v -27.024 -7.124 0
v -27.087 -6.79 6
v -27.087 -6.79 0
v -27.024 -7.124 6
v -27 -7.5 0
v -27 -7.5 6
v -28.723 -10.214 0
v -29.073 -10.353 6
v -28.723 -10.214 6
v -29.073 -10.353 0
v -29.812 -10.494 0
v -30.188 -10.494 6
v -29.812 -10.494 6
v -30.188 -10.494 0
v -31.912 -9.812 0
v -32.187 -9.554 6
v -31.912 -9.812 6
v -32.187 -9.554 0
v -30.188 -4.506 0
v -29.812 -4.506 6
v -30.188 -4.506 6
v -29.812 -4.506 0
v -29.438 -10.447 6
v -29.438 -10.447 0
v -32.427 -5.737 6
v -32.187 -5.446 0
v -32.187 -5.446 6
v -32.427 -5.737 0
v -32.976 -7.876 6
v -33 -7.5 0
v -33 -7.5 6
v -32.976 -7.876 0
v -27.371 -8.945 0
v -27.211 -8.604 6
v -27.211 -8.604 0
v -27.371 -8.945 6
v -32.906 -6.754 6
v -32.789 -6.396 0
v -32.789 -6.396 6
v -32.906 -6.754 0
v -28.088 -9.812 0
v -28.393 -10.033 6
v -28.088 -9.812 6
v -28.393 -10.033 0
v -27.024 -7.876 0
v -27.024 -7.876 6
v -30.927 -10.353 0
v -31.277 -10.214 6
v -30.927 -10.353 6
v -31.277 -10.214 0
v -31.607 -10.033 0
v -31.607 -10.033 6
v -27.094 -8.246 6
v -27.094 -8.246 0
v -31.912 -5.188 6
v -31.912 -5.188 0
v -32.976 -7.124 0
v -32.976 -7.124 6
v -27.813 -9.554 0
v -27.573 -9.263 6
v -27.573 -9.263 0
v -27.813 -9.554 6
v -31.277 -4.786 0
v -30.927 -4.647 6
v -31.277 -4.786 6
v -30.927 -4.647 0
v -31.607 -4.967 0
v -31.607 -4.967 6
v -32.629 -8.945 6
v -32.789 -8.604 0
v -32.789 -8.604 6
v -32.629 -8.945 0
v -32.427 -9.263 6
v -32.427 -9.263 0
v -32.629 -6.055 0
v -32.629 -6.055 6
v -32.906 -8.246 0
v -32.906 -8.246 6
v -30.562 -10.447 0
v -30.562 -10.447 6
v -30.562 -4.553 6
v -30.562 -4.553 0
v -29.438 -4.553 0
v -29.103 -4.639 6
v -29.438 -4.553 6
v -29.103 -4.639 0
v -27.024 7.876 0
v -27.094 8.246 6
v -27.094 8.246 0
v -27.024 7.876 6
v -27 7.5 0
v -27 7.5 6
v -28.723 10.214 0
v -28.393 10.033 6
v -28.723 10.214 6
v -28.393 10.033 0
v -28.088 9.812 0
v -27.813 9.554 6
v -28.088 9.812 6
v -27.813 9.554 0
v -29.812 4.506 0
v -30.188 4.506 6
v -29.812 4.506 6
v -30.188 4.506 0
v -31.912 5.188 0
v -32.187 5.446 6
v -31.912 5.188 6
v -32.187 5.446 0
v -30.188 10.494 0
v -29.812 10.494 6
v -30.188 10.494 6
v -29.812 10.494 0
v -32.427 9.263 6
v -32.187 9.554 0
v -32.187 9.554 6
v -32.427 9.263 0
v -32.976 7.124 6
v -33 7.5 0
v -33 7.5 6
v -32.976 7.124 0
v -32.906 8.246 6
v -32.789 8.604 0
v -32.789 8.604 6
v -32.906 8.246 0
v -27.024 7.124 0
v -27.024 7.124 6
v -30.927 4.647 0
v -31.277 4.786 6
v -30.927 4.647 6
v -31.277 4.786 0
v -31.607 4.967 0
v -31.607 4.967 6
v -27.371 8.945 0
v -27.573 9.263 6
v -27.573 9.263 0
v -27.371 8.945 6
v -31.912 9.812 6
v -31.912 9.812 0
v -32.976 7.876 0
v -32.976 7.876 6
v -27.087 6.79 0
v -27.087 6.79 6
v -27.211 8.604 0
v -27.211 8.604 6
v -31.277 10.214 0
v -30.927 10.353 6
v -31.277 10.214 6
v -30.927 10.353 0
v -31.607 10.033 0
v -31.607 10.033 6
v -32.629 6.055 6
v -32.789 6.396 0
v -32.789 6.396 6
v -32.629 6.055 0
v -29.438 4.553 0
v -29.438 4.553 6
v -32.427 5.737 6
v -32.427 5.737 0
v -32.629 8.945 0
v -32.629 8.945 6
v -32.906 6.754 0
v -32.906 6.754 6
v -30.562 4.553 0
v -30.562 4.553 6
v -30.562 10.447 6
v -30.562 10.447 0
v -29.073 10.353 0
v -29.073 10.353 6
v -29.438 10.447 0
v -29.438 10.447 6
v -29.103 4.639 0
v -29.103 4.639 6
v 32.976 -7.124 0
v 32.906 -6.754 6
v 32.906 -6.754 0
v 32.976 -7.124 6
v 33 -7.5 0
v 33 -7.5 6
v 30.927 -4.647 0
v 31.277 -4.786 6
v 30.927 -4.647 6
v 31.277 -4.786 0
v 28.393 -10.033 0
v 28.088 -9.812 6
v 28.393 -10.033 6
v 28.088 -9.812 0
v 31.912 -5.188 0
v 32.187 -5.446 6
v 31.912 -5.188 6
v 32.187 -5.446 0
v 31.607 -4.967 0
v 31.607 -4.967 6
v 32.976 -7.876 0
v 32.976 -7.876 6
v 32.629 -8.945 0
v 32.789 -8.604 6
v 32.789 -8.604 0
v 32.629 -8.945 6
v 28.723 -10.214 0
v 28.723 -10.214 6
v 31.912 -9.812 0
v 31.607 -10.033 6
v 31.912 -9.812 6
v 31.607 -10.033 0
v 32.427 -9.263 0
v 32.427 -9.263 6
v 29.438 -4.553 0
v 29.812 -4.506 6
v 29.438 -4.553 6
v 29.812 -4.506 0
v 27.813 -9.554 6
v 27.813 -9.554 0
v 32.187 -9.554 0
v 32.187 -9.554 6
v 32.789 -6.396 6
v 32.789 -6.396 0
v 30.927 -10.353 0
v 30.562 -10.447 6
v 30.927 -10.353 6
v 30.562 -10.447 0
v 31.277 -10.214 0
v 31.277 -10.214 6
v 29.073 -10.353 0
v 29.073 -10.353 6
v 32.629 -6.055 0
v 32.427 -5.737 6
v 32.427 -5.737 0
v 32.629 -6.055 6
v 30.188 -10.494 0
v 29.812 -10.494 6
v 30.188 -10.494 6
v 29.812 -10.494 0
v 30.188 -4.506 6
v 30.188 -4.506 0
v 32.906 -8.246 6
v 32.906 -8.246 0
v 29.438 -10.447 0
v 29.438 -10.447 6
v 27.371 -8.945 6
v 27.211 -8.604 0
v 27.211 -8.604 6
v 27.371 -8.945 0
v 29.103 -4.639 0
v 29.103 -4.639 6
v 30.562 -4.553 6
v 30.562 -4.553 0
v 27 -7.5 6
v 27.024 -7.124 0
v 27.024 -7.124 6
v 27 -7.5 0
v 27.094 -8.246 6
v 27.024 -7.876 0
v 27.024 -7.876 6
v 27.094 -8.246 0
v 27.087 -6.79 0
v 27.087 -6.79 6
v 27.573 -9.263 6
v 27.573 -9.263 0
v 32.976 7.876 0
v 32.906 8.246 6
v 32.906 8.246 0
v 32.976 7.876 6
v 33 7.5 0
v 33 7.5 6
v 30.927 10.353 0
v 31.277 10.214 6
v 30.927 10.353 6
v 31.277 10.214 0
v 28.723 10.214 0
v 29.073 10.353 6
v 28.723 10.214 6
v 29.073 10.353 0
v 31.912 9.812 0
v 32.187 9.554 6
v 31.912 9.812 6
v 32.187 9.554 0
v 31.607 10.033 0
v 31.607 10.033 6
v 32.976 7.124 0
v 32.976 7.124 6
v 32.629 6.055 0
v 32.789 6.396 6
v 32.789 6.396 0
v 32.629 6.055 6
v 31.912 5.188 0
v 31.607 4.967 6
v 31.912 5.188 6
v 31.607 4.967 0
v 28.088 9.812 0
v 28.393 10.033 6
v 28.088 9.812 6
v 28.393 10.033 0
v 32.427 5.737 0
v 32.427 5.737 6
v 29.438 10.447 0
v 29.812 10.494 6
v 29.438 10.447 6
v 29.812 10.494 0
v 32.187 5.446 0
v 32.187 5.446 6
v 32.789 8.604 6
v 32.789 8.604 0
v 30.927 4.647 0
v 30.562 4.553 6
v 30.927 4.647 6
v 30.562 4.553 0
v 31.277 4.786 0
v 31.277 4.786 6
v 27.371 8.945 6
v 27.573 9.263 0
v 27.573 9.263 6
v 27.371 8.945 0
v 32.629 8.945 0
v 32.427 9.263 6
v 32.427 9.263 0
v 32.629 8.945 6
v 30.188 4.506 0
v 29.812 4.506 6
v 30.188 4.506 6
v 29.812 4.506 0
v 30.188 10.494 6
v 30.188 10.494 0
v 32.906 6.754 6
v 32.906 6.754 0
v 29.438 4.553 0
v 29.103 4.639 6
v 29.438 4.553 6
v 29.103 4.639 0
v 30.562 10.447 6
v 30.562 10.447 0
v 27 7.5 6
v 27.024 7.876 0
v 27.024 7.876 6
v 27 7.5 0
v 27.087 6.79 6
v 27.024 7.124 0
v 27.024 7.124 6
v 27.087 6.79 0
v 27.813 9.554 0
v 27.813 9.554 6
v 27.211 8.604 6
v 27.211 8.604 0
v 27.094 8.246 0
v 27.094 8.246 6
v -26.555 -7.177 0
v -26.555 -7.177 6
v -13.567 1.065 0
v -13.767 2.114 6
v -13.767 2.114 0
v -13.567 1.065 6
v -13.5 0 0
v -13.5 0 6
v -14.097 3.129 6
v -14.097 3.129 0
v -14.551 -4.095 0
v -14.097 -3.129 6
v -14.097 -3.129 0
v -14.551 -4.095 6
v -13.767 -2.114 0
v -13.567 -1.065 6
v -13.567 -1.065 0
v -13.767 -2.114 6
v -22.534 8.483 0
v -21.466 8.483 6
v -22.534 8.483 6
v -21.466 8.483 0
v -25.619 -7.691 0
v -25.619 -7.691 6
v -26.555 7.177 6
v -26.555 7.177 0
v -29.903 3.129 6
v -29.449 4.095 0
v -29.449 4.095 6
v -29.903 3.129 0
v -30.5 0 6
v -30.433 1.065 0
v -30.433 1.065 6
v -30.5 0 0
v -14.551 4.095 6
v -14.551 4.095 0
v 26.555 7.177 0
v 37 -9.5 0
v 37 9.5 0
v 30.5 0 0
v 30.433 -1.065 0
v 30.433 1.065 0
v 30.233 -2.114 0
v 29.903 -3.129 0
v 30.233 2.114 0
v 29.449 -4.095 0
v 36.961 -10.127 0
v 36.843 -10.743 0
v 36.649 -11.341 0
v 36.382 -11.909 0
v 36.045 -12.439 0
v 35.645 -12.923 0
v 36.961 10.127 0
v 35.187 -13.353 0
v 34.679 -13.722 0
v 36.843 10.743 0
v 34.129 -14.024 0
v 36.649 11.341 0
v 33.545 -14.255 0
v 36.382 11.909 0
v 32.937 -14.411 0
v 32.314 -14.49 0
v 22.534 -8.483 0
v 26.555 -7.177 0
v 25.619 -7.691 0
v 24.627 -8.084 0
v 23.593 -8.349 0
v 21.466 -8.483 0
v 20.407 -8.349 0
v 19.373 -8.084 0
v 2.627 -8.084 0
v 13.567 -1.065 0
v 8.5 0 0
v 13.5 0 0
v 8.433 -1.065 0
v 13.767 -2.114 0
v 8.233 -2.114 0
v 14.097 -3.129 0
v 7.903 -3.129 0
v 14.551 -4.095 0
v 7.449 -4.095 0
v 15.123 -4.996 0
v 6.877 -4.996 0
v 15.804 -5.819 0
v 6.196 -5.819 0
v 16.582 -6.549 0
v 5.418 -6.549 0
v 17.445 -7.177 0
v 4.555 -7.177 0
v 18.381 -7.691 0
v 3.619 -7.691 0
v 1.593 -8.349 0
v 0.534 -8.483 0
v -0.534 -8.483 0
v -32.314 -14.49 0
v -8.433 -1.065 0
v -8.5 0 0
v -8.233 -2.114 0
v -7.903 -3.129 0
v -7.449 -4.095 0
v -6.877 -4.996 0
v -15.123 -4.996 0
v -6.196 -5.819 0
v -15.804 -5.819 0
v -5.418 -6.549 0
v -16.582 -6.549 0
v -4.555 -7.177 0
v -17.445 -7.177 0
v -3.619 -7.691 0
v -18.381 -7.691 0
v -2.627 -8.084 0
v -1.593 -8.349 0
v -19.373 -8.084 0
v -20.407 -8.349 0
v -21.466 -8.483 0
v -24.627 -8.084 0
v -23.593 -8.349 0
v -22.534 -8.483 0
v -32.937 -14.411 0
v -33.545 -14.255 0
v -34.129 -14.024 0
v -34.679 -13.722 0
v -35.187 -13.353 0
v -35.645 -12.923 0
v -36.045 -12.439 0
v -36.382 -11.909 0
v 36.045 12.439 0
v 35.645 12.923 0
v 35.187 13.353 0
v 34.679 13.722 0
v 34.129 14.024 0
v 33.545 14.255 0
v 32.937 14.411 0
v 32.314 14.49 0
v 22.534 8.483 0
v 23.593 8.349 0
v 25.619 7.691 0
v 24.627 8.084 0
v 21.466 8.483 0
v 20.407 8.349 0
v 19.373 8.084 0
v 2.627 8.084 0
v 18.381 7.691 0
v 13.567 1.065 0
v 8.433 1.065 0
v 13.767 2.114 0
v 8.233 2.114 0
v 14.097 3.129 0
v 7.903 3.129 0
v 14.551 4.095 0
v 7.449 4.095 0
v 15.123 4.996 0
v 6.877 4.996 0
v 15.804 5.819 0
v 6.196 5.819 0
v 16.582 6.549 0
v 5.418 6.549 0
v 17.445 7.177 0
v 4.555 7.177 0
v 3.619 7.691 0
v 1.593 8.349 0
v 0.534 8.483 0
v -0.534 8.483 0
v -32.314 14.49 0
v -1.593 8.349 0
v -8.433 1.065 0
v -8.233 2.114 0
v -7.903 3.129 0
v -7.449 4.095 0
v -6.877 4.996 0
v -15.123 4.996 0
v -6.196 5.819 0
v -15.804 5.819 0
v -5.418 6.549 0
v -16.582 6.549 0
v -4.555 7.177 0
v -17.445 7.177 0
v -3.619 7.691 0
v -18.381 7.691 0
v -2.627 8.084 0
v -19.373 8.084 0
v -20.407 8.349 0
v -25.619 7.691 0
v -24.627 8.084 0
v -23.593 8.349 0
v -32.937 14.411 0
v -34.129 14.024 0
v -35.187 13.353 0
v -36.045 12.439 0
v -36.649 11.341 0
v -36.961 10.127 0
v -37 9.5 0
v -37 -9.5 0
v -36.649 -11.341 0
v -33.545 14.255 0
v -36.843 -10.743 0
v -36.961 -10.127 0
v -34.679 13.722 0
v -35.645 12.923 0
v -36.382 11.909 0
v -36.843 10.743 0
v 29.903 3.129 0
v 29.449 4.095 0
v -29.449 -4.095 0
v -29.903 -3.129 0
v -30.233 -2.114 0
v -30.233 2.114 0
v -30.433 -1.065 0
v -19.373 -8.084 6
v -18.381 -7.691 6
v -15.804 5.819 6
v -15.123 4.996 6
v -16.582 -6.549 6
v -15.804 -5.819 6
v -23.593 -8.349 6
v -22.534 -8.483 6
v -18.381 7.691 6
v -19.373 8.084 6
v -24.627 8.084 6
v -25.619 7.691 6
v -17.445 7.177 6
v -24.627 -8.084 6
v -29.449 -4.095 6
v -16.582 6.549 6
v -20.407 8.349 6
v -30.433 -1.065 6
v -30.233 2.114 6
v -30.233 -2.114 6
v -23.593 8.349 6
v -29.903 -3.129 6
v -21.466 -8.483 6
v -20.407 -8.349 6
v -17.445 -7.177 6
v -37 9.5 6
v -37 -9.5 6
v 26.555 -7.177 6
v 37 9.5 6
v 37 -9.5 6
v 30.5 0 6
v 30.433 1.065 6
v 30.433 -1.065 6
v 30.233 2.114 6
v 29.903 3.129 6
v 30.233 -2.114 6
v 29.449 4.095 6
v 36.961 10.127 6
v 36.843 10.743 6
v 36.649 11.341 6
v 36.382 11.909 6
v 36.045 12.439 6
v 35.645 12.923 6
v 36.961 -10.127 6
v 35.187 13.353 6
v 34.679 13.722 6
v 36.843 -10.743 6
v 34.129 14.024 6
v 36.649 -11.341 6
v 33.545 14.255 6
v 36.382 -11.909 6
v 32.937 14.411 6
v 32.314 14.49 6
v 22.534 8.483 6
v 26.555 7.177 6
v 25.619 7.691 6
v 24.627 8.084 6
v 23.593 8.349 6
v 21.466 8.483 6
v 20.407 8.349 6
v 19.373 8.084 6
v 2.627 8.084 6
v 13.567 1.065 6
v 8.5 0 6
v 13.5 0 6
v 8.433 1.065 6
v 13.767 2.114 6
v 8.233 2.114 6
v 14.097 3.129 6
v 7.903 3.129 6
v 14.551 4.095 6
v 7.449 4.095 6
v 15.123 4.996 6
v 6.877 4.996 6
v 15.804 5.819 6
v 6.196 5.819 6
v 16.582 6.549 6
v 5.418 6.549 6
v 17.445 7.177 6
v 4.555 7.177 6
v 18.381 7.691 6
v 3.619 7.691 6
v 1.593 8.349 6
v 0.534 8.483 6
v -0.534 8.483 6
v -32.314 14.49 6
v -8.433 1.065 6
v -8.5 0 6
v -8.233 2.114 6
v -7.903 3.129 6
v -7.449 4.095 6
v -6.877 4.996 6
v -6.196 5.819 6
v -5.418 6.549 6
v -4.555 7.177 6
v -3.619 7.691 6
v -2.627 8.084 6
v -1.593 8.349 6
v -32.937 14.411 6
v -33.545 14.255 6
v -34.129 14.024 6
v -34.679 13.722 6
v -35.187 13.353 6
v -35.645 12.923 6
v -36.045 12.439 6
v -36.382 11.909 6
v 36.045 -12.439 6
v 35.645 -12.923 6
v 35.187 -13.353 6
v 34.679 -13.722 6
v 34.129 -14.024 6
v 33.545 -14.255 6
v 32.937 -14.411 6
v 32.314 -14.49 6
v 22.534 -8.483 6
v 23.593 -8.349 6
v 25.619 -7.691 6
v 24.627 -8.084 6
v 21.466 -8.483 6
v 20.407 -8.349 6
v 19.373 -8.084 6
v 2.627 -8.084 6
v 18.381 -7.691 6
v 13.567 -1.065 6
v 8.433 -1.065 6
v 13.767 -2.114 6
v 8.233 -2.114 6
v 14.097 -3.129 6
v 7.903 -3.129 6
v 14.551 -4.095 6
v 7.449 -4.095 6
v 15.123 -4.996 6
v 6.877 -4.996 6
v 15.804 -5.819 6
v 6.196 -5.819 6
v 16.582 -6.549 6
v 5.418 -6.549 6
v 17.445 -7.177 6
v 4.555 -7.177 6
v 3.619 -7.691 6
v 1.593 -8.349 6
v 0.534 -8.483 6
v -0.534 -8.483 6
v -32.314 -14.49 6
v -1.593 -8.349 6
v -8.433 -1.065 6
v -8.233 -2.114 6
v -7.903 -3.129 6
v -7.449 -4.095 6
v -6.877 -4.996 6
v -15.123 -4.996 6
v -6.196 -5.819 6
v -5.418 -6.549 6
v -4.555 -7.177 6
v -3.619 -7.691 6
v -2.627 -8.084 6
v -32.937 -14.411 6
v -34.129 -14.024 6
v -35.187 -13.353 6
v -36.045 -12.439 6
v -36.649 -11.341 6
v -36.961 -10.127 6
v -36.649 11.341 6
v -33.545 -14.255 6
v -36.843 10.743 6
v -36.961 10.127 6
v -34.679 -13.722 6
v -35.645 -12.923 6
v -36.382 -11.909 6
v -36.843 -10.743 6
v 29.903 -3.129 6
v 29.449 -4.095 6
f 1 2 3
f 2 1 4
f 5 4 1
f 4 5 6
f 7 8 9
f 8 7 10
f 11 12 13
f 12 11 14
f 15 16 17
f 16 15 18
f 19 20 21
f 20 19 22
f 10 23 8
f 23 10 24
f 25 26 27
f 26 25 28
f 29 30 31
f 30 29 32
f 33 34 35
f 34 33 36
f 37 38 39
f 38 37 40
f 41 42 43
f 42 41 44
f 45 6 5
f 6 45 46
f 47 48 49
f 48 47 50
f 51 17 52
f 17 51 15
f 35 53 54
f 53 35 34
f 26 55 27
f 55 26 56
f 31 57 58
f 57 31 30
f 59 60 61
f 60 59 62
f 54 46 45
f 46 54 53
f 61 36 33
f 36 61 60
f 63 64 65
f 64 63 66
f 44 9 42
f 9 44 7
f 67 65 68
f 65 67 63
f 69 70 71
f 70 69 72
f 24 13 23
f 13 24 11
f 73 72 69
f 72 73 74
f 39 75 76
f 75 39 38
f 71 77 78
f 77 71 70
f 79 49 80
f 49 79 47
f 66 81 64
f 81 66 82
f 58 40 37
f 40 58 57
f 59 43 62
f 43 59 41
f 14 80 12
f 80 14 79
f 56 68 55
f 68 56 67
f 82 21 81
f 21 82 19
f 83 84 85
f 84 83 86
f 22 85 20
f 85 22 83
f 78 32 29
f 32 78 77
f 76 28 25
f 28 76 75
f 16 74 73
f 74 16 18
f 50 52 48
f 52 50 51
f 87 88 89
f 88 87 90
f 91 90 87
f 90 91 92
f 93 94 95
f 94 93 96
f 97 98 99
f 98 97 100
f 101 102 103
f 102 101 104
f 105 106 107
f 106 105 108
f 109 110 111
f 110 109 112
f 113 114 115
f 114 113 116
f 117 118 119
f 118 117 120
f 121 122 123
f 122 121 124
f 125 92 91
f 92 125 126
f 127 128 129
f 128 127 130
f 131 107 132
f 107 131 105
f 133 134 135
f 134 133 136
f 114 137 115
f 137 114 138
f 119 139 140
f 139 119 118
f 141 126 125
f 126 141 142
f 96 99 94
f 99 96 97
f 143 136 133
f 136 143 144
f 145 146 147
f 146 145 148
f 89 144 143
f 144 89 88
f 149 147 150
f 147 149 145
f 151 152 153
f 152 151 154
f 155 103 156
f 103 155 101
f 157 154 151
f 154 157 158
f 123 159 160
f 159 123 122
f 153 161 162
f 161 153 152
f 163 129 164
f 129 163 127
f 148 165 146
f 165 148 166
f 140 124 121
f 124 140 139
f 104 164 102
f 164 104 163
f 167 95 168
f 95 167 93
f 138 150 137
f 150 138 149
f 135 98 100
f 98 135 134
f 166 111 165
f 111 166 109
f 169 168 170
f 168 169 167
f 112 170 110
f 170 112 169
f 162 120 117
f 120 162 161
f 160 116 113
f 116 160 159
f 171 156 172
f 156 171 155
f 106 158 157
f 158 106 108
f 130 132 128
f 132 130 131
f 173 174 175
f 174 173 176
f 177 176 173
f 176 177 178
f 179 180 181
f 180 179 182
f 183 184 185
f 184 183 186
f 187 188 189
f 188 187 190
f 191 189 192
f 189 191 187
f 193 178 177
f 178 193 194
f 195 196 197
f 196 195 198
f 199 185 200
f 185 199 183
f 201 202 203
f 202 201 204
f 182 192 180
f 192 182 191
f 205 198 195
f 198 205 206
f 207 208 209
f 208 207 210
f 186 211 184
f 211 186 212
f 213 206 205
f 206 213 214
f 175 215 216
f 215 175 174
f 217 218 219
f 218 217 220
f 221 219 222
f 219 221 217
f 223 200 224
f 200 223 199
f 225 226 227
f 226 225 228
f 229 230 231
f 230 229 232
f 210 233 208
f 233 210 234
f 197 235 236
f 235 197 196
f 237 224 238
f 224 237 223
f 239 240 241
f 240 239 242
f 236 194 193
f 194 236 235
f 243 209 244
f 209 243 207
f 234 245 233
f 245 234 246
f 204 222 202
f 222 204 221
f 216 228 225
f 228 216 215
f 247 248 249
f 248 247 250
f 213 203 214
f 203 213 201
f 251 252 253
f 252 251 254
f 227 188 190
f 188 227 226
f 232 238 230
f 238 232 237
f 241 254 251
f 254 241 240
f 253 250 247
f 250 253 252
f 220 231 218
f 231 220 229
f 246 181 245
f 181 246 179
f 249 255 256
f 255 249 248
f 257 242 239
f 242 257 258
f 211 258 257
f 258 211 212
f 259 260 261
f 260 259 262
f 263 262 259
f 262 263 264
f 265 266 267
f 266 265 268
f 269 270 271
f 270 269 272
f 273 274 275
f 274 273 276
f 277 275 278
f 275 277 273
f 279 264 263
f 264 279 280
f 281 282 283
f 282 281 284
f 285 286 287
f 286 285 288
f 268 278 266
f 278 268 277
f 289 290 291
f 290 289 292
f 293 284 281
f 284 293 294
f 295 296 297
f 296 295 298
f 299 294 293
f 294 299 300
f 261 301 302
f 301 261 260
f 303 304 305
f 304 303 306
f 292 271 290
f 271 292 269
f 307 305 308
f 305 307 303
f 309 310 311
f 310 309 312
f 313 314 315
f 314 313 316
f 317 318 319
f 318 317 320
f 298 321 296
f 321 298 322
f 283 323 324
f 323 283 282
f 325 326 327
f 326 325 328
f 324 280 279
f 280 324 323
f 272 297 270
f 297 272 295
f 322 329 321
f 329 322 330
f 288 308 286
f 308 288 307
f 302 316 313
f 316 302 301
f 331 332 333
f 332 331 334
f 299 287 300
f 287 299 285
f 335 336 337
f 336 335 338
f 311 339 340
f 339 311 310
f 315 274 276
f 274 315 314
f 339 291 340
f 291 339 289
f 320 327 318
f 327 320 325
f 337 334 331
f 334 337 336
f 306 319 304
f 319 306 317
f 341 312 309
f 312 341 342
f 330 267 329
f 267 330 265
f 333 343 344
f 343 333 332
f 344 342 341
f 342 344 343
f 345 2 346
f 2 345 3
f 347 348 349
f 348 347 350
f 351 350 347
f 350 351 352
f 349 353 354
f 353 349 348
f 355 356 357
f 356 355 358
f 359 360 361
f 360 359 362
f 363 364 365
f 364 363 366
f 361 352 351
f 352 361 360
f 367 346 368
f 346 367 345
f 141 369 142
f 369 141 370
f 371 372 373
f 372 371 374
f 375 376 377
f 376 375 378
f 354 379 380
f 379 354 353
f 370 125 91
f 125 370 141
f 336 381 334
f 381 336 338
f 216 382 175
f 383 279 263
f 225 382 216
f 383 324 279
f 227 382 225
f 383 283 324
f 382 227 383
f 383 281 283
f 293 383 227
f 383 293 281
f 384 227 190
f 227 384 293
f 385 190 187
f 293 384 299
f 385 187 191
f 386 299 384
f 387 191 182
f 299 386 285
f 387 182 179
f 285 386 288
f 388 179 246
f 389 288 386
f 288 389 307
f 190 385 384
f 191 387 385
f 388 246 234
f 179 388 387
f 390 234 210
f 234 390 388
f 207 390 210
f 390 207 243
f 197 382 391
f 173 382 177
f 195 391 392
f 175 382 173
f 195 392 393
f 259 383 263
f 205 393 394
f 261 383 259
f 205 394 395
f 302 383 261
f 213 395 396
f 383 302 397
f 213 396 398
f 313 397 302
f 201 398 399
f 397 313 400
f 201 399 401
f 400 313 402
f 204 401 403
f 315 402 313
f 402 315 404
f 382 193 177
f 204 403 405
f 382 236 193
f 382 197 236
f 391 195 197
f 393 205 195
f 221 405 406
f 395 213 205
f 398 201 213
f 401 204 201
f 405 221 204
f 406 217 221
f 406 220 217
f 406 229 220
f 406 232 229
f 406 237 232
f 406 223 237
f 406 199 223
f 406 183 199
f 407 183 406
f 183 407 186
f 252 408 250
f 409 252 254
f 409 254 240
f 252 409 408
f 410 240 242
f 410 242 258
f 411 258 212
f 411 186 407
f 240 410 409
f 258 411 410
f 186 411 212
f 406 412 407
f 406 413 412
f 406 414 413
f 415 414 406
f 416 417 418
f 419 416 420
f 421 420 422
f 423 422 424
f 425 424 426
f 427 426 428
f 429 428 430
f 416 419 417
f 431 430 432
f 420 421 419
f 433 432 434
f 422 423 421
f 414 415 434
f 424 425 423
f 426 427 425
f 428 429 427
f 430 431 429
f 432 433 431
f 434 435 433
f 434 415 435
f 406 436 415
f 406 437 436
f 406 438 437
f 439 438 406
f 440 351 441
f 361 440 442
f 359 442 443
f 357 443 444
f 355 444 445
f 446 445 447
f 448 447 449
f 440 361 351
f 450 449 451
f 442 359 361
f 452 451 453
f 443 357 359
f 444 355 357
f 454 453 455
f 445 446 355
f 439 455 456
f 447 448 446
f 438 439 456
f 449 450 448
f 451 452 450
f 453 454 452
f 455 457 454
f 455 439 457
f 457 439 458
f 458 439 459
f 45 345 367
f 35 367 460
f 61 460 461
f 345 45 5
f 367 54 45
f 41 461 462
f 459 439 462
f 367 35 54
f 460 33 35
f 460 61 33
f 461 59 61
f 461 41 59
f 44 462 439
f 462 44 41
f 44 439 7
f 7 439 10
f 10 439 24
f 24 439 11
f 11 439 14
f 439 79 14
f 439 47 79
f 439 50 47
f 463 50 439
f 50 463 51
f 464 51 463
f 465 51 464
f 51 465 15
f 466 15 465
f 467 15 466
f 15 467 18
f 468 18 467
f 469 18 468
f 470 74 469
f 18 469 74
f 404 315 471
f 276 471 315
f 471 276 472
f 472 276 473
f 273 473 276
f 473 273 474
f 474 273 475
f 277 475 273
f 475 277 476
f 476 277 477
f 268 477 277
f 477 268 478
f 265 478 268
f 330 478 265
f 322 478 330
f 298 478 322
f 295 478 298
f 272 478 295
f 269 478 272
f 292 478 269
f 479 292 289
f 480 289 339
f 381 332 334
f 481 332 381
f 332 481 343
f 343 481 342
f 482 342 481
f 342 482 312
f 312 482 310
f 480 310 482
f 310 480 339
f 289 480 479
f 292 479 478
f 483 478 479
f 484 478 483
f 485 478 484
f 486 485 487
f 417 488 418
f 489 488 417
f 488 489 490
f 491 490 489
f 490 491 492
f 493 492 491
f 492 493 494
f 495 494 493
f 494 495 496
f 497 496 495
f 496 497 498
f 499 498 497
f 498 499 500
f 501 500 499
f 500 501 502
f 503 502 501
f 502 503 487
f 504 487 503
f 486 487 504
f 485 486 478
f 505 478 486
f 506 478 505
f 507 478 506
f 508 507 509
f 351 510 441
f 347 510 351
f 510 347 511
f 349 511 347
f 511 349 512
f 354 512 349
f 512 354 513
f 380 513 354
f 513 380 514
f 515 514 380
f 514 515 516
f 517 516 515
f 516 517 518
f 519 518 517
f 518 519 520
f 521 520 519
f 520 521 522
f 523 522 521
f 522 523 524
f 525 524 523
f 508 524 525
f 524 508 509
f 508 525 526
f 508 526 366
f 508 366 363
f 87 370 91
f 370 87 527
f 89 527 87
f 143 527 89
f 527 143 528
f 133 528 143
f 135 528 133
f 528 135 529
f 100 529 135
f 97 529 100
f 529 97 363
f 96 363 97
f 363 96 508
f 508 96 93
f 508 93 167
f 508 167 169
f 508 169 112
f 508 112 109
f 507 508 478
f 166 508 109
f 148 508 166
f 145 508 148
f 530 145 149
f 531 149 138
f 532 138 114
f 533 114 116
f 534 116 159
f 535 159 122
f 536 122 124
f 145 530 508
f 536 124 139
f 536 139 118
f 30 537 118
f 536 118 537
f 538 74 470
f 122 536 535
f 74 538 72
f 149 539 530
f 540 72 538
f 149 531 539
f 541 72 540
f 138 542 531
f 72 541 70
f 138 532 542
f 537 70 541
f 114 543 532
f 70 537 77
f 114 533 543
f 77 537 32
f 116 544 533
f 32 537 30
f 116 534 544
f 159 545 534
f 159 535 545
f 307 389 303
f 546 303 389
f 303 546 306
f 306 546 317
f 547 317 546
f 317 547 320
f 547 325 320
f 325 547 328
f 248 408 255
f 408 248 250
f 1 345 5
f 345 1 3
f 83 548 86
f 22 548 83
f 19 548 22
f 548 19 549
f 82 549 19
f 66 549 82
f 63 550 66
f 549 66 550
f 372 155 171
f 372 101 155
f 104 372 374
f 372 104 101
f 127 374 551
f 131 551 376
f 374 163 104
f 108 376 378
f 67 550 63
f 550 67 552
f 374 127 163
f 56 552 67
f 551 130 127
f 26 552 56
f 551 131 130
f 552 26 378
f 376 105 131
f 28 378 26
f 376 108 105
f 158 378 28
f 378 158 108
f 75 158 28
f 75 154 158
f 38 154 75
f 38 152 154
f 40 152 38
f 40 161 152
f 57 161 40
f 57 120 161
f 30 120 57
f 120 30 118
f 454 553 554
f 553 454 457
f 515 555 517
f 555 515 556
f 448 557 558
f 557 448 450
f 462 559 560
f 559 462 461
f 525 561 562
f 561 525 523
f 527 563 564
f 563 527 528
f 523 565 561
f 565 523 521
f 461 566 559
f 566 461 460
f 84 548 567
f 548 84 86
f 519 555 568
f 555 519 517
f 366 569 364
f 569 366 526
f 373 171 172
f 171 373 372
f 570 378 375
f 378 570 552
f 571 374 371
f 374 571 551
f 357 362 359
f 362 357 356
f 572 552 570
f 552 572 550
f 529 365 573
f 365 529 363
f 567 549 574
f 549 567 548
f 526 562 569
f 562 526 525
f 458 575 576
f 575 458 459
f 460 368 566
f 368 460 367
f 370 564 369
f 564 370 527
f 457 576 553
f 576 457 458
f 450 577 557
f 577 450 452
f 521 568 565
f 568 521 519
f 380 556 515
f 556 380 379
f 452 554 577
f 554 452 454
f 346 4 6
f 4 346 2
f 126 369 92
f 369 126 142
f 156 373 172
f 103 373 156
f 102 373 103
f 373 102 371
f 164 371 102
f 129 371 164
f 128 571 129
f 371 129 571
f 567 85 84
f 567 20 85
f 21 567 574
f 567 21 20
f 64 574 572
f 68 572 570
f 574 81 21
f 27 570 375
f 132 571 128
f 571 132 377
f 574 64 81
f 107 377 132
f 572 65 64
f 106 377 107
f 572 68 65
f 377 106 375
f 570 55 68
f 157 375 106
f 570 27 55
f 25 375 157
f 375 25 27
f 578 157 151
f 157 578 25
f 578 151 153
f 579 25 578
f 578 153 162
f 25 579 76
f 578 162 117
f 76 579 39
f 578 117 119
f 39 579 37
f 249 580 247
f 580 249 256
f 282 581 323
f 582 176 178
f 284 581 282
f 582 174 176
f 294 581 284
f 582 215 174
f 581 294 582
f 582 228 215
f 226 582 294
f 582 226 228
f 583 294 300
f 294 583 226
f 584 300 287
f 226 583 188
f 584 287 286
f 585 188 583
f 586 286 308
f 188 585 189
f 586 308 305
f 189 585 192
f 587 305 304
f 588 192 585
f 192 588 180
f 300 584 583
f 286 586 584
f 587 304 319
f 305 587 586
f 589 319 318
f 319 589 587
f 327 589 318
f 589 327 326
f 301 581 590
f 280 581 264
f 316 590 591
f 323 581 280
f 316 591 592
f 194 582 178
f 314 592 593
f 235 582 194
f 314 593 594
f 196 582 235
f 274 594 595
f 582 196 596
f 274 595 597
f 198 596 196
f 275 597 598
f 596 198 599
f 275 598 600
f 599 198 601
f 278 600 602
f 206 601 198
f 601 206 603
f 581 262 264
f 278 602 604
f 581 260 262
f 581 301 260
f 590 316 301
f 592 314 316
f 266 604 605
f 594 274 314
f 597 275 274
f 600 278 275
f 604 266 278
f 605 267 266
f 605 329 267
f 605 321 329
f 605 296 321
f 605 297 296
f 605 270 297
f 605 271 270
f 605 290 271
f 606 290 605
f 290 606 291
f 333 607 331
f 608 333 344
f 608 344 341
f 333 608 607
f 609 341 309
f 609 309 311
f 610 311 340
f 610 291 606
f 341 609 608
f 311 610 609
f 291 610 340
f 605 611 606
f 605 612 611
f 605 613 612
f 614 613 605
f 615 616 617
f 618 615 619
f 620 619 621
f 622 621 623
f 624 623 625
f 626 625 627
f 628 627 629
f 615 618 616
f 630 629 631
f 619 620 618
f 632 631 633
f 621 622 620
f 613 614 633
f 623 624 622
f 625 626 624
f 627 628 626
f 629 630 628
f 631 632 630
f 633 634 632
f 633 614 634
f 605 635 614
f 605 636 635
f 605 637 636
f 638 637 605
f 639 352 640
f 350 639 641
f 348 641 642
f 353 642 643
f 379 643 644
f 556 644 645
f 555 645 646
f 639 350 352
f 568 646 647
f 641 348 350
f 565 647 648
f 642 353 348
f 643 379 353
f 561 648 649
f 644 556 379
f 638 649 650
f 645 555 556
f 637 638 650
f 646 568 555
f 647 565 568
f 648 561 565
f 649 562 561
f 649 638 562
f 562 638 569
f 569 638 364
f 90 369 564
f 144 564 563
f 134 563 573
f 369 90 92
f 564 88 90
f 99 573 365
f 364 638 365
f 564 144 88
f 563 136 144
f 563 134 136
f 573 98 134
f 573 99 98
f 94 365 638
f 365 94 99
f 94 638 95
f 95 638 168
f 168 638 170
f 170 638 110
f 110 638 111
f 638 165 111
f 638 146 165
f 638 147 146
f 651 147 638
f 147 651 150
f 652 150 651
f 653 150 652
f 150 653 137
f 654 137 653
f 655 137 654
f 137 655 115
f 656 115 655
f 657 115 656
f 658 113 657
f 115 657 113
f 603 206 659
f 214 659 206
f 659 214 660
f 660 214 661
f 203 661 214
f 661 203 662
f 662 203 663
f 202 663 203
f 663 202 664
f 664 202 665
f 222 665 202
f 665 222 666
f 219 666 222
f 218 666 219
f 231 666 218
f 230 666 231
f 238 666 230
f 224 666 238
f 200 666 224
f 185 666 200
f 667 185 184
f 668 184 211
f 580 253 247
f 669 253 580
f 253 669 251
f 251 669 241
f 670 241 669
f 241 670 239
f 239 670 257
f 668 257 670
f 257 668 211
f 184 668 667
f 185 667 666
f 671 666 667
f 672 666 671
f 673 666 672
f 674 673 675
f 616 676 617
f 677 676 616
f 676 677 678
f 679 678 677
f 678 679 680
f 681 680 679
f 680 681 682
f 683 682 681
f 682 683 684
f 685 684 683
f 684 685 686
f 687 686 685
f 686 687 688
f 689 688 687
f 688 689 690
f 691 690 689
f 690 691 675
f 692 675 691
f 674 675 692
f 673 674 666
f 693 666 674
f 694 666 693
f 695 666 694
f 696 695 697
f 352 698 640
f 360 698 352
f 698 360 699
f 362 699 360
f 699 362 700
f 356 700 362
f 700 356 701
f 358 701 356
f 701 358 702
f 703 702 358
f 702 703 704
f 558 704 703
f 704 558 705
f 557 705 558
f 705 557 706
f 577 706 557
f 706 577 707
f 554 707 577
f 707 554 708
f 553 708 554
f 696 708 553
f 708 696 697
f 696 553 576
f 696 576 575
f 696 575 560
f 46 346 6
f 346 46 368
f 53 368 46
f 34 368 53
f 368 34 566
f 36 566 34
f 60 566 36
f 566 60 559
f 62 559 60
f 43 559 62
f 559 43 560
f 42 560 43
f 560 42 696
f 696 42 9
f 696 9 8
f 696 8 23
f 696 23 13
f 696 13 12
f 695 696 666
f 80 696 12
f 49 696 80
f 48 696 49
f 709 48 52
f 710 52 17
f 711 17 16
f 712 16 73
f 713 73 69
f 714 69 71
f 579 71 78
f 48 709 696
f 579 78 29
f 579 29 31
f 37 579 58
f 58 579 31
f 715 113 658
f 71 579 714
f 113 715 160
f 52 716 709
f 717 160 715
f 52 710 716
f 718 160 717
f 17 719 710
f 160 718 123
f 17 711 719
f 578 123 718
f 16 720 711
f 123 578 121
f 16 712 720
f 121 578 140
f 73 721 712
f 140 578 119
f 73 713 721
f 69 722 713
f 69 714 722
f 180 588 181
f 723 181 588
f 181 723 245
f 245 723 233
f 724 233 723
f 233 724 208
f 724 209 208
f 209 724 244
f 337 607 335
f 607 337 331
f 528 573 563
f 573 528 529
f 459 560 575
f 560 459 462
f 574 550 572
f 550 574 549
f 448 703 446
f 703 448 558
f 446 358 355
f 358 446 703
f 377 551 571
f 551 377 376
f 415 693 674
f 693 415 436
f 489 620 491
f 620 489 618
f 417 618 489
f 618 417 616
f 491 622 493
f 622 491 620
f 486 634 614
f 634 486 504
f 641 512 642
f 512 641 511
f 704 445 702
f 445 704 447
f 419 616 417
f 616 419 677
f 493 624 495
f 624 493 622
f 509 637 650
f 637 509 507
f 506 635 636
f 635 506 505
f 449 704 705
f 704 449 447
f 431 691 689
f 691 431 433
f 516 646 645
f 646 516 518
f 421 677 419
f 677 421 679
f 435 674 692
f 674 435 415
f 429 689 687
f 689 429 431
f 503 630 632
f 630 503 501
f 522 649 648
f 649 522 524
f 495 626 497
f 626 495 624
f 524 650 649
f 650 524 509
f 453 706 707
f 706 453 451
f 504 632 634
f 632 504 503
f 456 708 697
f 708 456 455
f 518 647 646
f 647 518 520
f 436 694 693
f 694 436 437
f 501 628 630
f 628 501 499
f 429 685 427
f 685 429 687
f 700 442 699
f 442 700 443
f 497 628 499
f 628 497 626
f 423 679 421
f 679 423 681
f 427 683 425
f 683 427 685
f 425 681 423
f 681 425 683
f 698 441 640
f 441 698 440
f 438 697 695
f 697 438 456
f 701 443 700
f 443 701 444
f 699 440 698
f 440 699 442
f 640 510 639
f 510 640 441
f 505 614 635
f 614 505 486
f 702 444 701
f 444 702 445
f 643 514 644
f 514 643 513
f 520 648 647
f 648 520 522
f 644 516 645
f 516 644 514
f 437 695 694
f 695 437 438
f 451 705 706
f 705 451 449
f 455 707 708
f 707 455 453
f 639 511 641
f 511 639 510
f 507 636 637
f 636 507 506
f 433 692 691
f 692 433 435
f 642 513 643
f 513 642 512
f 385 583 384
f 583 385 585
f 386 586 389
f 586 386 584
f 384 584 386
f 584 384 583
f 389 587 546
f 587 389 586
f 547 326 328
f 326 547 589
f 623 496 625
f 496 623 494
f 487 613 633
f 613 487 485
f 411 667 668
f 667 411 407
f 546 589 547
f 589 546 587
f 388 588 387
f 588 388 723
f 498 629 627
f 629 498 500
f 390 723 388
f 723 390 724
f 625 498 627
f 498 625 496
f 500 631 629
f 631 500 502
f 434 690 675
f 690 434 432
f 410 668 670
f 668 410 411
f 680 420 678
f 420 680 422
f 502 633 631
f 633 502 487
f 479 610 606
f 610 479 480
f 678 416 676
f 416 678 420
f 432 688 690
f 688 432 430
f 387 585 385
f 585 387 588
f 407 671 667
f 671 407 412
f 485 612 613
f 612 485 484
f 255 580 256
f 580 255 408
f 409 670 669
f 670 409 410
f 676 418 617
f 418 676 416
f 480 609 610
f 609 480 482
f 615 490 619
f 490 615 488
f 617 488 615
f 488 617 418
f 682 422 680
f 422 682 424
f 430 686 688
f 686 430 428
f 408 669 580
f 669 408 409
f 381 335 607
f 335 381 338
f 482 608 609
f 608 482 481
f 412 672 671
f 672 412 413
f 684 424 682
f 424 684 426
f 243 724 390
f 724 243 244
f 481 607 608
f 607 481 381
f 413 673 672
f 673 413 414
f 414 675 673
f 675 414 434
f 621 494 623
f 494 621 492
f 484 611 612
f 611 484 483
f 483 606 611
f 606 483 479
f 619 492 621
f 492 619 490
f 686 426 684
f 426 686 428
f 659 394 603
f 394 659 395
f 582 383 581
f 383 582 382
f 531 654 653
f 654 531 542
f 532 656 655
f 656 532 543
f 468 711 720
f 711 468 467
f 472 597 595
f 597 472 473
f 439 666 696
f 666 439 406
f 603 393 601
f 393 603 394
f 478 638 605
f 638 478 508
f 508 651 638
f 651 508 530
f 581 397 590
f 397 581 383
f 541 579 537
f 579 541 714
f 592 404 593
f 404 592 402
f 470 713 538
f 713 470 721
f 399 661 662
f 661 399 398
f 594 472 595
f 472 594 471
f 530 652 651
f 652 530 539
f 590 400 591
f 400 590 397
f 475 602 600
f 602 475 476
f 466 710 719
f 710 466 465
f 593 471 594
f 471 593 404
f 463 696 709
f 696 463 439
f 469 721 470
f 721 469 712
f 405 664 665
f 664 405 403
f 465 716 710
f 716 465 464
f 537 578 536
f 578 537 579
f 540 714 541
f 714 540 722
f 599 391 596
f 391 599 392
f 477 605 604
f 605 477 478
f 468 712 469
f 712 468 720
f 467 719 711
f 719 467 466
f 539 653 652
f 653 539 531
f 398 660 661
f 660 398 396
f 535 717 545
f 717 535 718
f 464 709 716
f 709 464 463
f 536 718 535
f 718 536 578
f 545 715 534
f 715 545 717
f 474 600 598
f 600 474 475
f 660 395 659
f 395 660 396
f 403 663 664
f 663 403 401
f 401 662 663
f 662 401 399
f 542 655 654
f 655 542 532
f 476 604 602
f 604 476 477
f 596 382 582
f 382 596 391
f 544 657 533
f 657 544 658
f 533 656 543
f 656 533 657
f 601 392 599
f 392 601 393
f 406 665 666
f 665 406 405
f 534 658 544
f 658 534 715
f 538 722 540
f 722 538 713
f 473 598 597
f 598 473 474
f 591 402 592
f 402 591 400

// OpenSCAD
$fn = 50;


difference() {
	union() {
		hull() {
			translate(v = [-32.0000000000, 9.5000000000, 0]) {
				cylinder(h = 6, r = 5);
			}
			translate(v = [32.0000000000, 9.5000000000, 0]) {
				cylinder(h = 6, r = 5);
			}
			translate(v = [-32.0000000000, -9.5000000000, 0]) {
				cylinder(h = 6, r = 5);
			}
			translate(v = [32.0000000000, -9.5000000000, 0]) {
				cylinder(h = 6, r = 5);
			}
		}
	}
	union() {
		#translate(v = [-30.0000000000, -7.5000000000, -100.0000000000]) {
			cylinder(h = 200, r = 3.0000000000);
		}
		#translate(v = [-30.0000000000, 7.5000000000, -100.0000000000]) {
			cylinder(h = 200, r = 3.0000000000);
		}
		#translate(v = [30.0000000000, -7.5000000000, -100.0000000000]) {
			cylinder(h = 200, r = 3.0000000000);
		}
		#translate(v = [30.0000000000, 7.5000000000, -100.0000000000]) {
			cylinder(h = 200, r = 3.0000000000);
		}
		#translate(v = [-22.0000000000, 0, 0]) {
			cylinder(h = 6, r = 8.5000000000);
		}
		#cylinder(h = 6, r = 8.5000000000);
		#translate(v = [22.0000000000, 0, 0]) {
			cylinder(h = 6, r = 8.5000000000);
		}
	}
}
